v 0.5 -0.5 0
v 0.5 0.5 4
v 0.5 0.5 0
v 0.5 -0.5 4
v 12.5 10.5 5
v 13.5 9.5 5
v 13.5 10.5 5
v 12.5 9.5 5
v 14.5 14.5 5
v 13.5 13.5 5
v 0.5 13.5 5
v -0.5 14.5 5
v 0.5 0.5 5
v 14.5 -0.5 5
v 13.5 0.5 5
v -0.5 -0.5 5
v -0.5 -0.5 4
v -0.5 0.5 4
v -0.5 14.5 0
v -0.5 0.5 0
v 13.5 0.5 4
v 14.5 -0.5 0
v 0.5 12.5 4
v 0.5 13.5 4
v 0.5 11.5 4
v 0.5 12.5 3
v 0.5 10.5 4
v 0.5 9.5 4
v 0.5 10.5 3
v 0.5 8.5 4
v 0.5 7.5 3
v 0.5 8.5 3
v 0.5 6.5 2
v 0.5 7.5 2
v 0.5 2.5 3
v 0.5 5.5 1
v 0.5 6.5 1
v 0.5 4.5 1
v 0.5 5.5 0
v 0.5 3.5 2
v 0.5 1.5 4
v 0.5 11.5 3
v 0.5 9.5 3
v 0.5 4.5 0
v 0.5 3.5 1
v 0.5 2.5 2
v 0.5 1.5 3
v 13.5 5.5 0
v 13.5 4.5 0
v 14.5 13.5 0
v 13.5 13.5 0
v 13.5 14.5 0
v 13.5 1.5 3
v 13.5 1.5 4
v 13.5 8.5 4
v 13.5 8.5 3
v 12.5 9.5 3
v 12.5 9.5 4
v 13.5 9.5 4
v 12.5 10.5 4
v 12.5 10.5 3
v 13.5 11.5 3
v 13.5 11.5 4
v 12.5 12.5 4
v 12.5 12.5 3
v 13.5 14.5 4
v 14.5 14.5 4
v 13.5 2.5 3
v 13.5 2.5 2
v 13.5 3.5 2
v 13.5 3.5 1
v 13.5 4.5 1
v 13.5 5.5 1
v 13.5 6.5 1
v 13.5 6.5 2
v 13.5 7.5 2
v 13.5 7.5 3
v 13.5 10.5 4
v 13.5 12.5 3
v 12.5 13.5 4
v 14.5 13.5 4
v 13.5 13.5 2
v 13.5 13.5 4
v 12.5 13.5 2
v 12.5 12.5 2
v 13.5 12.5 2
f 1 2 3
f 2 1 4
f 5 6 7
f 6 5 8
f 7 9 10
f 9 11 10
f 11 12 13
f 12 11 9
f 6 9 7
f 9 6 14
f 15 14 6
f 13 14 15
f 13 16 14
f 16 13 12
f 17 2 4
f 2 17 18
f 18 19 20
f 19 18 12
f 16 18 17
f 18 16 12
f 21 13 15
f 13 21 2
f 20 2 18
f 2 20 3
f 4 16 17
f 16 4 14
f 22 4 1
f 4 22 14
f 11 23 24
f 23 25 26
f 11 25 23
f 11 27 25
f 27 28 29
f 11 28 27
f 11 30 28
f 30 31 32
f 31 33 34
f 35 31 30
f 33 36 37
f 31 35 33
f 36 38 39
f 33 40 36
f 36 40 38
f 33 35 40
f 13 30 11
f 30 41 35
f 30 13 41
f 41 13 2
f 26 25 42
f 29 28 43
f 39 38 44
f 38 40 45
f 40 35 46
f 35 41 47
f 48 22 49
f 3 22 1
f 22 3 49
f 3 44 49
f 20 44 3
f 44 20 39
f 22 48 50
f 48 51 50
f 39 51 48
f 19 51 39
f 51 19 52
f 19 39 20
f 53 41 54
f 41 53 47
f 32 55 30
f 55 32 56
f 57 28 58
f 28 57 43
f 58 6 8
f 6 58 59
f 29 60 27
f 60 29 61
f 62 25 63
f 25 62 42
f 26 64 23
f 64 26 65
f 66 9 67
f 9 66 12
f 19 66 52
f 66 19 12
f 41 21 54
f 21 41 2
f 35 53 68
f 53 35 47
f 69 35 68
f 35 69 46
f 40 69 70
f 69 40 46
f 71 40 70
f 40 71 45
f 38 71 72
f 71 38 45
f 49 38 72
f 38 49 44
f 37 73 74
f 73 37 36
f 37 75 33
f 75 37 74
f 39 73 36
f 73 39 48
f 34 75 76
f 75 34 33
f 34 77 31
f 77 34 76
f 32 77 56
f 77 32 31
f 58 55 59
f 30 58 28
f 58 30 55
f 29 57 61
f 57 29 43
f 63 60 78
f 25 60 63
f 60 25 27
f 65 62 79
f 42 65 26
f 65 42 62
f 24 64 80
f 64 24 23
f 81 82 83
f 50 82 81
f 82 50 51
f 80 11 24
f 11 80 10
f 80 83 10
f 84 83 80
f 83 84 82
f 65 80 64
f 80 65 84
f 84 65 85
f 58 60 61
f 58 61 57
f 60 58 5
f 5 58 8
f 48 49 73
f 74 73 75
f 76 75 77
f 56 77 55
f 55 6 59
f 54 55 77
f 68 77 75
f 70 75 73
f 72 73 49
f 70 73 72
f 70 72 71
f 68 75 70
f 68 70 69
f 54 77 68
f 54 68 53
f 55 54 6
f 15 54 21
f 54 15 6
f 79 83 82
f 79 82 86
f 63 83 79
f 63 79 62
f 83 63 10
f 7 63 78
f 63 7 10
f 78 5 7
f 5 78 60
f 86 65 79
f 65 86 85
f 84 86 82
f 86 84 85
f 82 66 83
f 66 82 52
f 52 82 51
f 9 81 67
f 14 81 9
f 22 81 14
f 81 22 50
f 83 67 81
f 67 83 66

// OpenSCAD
union() {
    translate([0, 0, 4.5]) color([1, 0, 0]) cube([1, 1, 1], center=true);
    translate([0, 1, 2.5]) cube([1, 1, 5], center=true);
    translate([0, 2, 2.5]) cube([1, 1, 5], center=true);
    translate([0, 3, 2.5]) cube([1, 1, 5], center=true);
    translate([0, 4, 2.5]) cube([1, 1, 5], center=true);
    translate([0, 5, 2.5]) cube([1, 1, 5], center=true);
    translate([0, 6, 2.5]) cube([1, 1, 5], center=true);
    translate([0, 7, 2.5]) cube([1, 1, 5], center=true);
    translate([0, 8, 2.5]) cube([1, 1, 5], center=true);
    translate([0, 9, 2.5]) cube([1, 1, 5], center=true);
    translate([0, 10, 2.5]) cube([1, 1, 5], center=true);
    translate([0, 11, 2.5]) cube([1, 1, 5], center=true);
    translate([0, 12, 2.5]) cube([1, 1, 5], center=true);
    translate([0, 13, 2.5]) cube([1, 1, 5], center=true);
    translate([0, 14, 2.5]) cube([1, 1, 5], center=true);
    translate([1, 0, 2.5]) cube([1, 1, 5], center=true);
    translate([1, 1, 2.0]) cube([1, 1, 4], center=true);
    translate([1, 2, 1.5]) cube([1, 1, 3], center=true);
    translate([1, 3, 1.0]) cube([1, 1, 2], center=true);
    translate([1, 4, 0.5]) cube([1, 1, 1], center=true);
    translate([1, 6, 0.5]) cube([1, 1, 1], center=true);
    translate([1, 7, 1.0]) cube([1, 1, 2], center=true);
    translate([1, 8, 1.5]) cube([1, 1, 3], center=true);
    translate([1, 9, 2.0]) cube([1, 1, 4], center=true);
    translate([1, 10, 1.5]) cube([1, 1, 3], center=true);
    translate([1, 11, 2.0]) cube([1, 1, 4], center=true);
    translate([1, 12, 1.5]) cube([1, 1, 3], center=true);
    translate([1, 13, 2.0]) cube([1, 1, 4], center=true);
    translate([1, 14, 2.5]) cube([1, 1, 5], center=true);
    translate([2, 0, 2.5]) cube([1, 1, 5], center=true);
    translate([2, 1, 2.0]) cube([1, 1, 4], center=true);
    translate([2, 2, 1.5]) cube([1, 1, 3], center=true);
    translate([2, 3, 1.0]) cube([1, 1, 2], center=true);
    translate([2, 4, 0.5]) cube([1, 1, 1], center=true);
    translate([2, 6, 0.5]) cube([1, 1, 1], center=true);
    translate([2, 7, 1.0]) cube([1, 1, 2], center=true);
    translate([2, 8, 1.5]) cube([1, 1, 3], center=true);
    translate([2, 9, 2.0]) cube([1, 1, 4], center=true);
    translate([2, 10, 1.5]) cube([1, 1, 3], center=true);
    translate([2, 11, 2.0]) cube([1, 1, 4], center=true);
    translate([2, 12, 1.5]) cube([1, 1, 3], center=true);
    translate([2, 13, 2.0]) cube([1, 1, 4], center=true);
    translate([2, 14, 2.5]) cube([1, 1, 5], center=true);
    translate([3, 0, 2.5]) cube([1, 1, 5], center=true);
    translate([3, 1, 2.0]) cube([1, 1, 4], center=true);
    translate([3, 2, 1.5]) cube([1, 1, 3], center=true);
    translate([3, 3, 1.0]) cube([1, 1, 2], center=true);
    translate([3, 4, 0.5]) cube([1, 1, 1], center=true);
    translate([3, 6, 0.5]) cube([1, 1, 1], center=true);
    translate([3, 7, 1.0]) cube([1, 1, 2], center=true);
    translate([3, 8, 1.5]) cube([1, 1, 3], center=true);
    translate([3, 9, 2.0]) cube([1, 1, 4], center=true);
    translate([3, 10, 1.5]) cube([1, 1, 3], center=true);
    translate([3, 11, 2.0]) cube([1, 1, 4], center=true);
    translate([3, 12, 1.5]) cube([1, 1, 3], center=true);
    translate([3, 13, 2.0]) cube([1, 1, 4], center=true);
    translate([3, 14, 2.5]) cube([1, 1, 5], center=true);
    translate([4, 0, 2.5]) cube([1, 1, 5], center=true);
    translate([4, 1, 2.0]) cube([1, 1, 4], center=true);
    translate([4, 2, 1.5]) cube([1, 1, 3], center=true);
    translate([4, 3, 1.0]) cube([1, 1, 2], center=true);
    translate([4, 4, 0.5]) cube([1, 1, 1], center=true);
    translate([4, 6, 0.5]) cube([1, 1, 1], center=true);
    translate([4, 7, 1.0]) cube([1, 1, 2], center=true);
    translate([4, 8, 1.5]) cube([1, 1, 3], center=true);
    translate([4, 9, 2.0]) cube([1, 1, 4], center=true);
    translate([4, 10, 1.5]) cube([1, 1, 3], center=true);
    translate([4, 11, 2.0]) cube([1, 1, 4], center=true);
    translate([4, 12, 1.5]) cube([1, 1, 3], center=true);
    translate([4, 13, 2.0]) cube([1, 1, 4], center=true);
    translate([4, 14, 2.5]) cube([1, 1, 5], center=true);
    translate([5, 0, 2.5]) cube([1, 1, 5], center=true);
    translate([5, 1, 2.0]) cube([1, 1, 4], center=true);
    translate([5, 2, 1.5]) cube([1, 1, 3], center=true);
    translate([5, 3, 1.0]) cube([1, 1, 2], center=true);
    translate([5, 4, 0.5]) cube([1, 1, 1], center=true);
    translate([5, 6, 0.5]) cube([1, 1, 1], center=true);
    translate([5, 7, 1.0]) cube([1, 1, 2], center=true);
    translate([5, 8, 1.5]) cube([1, 1, 3], center=true);
    translate([5, 9, 2.0]) cube([1, 1, 4], center=true);
    translate([5, 10, 1.5]) cube([1, 1, 3], center=true);
    translate([5, 11, 2.0]) cube([1, 1, 4], center=true);
    translate([5, 12, 1.5]) cube([1, 1, 3], center=true);
    translate([5, 13, 2.0]) cube([1, 1, 4], center=true);
    translate([5, 14, 2.5]) cube([1, 1, 5], center=true);
    translate([6, 0, 2.5]) cube([1, 1, 5], center=true);
    translate([6, 1, 2.0]) cube([1, 1, 4], center=true);
    translate([6, 2, 1.5]) cube([1, 1, 3], center=true);
    translate([6, 3, 1.0]) cube([1, 1, 2], center=true);
    translate([6, 4, 0.5]) cube([1, 1, 1], center=true);
    translate([6, 6, 0.5]) cube([1, 1, 1], center=true);
    translate([6, 7, 1.0]) cube([1, 1, 2], center=true);
    translate([6, 8, 1.5]) cube([1, 1, 3], center=true);
    translate([6, 9, 2.0]) cube([1, 1, 4], center=true);
    translate([6, 10, 1.5]) cube([1, 1, 3], center=true);
    translate([6, 11, 2.0]) cube([1, 1, 4], center=true);
    translate([6, 12, 1.5]) cube([1, 1, 3], center=true);
    translate([6, 13, 2.0]) cube([1, 1, 4], center=true);
    translate([6, 14, 2.5]) cube([1, 1, 5], center=true);
    translate([7, 0, 2.5]) cube([1, 1, 5], center=true);
    translate([7, 1, 2.0]) cube([1, 1, 4], center=true);
    translate([7, 2, 1.5]) cube([1, 1, 3], center=true);
    translate([7, 3, 1.0]) cube([1, 1, 2], center=true);
    translate([7, 4, 0.5]) cube([1, 1, 1], center=true);
    translate([7, 6, 0.5]) cube([1, 1, 1], center=true);
    translate([7, 7, 1.0]) cube([1, 1, 2], center=true);
    translate([7, 8, 1.5]) cube([1, 1, 3], center=true);
    translate([7, 9, 2.0]) cube([1, 1, 4], center=true);
    translate([7, 10, 1.5]) cube([1, 1, 3], center=true);
    translate([7, 11, 2.0]) cube([1, 1, 4], center=true);
    translate([7, 12, 1.5]) cube([1, 1, 3], center=true);
    translate([7, 13, 2.0]) cube([1, 1, 4], center=true);
    translate([7, 14, 2.5]) cube([1, 1, 5], center=true);
    translate([8, 0, 2.5]) cube([1, 1, 5], center=true);
    translate([8, 1, 2.0]) cube([1, 1, 4], center=true);
    translate([8, 2, 1.5]) cube([1, 1, 3], center=true);
    translate([8, 3, 1.0]) cube([1, 1, 2], center=true);
    translate([8, 4, 0.5]) cube([1, 1, 1], center=true);
    translate([8, 6, 0.5]) cube([1, 1, 1], center=true);
    translate([8, 7, 1.0]) cube([1, 1, 2], center=true);
    translate([8, 8, 1.5]) cube([1, 1, 3], center=true);
    translate([8, 9, 2.0]) cube([1, 1, 4], center=true);
    translate([8, 10, 1.5]) cube([1, 1, 3], center=true);
    translate([8, 11, 2.0]) cube([1, 1, 4], center=true);
    translate([8, 12, 1.5]) cube([1, 1, 3], center=true);
    translate([8, 13, 2.0]) cube([1, 1, 4], center=true);
    translate([8, 14, 2.5]) cube([1, 1, 5], center=true);
    translate([9, 0, 2.5]) cube([1, 1, 5], center=true);
    translate([9, 1, 2.0]) cube([1, 1, 4], center=true);
    translate([9, 2, 1.5]) cube([1, 1, 3], center=true);
    translate([9, 3, 1.0]) cube([1, 1, 2], center=true);
    translate([9, 4, 0.5]) cube([1, 1, 1], center=true);
    translate([9, 6, 0.5]) cube([1, 1, 1], center=true);
    translate([9, 7, 1.0]) cube([1, 1, 2], center=true);
    translate([9, 8, 1.5]) cube([1, 1, 3], center=true);
    translate([9, 9, 2.0]) cube([1, 1, 4], center=true);
    translate([9, 10, 1.5]) cube([1, 1, 3], center=true);
    translate([9, 11, 2.0]) cube([1, 1, 4], center=true);
    translate([9, 12, 1.5]) cube([1, 1, 3], center=true);
    translate([9, 13, 2.0]) cube([1, 1, 4], center=true);
    translate([9, 14, 2.5]) cube([1, 1, 5], center=true);
    translate([10, 0, 2.5]) cube([1, 1, 5], center=true);
    translate([10, 1, 2.0]) cube([1, 1, 4], center=true);
    translate([10, 2, 1.5]) cube([1, 1, 3], center=true);
    translate([10, 3, 1.0]) cube([1, 1, 2], center=true);
    translate([10, 4, 0.5]) cube([1, 1, 1], center=true);
    translate([10, 6, 0.5]) cube([1, 1, 1], center=true);
    translate([10, 7, 1.0]) cube([1, 1, 2], center=true);
    translate([10, 8, 1.5]) cube([1, 1, 3], center=true);
    translate([10, 9, 2.0]) cube([1, 1, 4], center=true);
    translate([10, 10, 1.5]) cube([1, 1, 3], center=true);
    translate([10, 11, 2.0]) cube([1, 1, 4], center=true);
    translate([10, 12, 1.5]) cube([1, 1, 3], center=true);
    translate([10, 13, 2.0]) cube([1, 1, 4], center=true);
    translate([10, 14, 2.5]) cube([1, 1, 5], center=true);
    translate([11, 0, 2.5]) cube([1, 1, 5], center=true);
    translate([11, 1, 2.0]) cube([1, 1, 4], center=true);
    translate([11, 2, 1.5]) cube([1, 1, 3], center=true);
    translate([11, 3, 1.0]) cube([1, 1, 2], center=true);
    translate([11, 4, 0.5]) cube([1, 1, 1], center=true);
    translate([11, 6, 0.5]) cube([1, 1, 1], center=true);
    translate([11, 7, 1.0]) cube([1, 1, 2], center=true);
    translate([11, 8, 1.5]) cube([1, 1, 3], center=true);
    translate([11, 9, 2.0]) cube([1, 1, 4], center=true);
    translate([11, 10, 1.5]) cube([1, 1, 3], center=true);
    translate([11, 11, 2.0]) cube([1, 1, 4], center=true);
    translate([11, 12, 1.5]) cube([1, 1, 3], center=true);
    translate([11, 13, 2.0]) cube([1, 1, 4], center=true);
    translate([11, 14, 2.5]) cube([1, 1, 5], center=true);
    translate([12, 0, 2.5]) cube([1, 1, 5], center=true);
    translate([12, 1, 2.0]) cube([1, 1, 4], center=true);
    translate([12, 2, 1.5]) cube([1, 1, 3], center=true);
    translate([12, 3, 1.0]) cube([1, 1, 2], center=true);
    translate([12, 4, 0.5]) cube([1, 1, 1], center=true);
    translate([12, 6, 0.5]) cube([1, 1, 1], center=true);
    translate([12, 7, 1.0]) cube([1, 1, 2], center=true);
    translate([12, 8, 1.5]) cube([1, 1, 3], center=true);
    translate([12, 9, 2.0]) cube([1, 1, 4], center=true);
    translate([12, 10, 1.5]) cube([1, 1, 3], center=true);
    translate([12, 11, 2.0]) cube([1, 1, 4], center=true);
    translate([12, 12, 1.5]) cube([1, 1, 3], center=true);
    translate([12, 13, 2.0]) cube([1, 1, 4], center=true);
    translate([12, 14, 2.5]) cube([1, 1, 5], center=true);
    translate([13, 0, 2.5]) cube([1, 1, 5], center=true);
    translate([13, 1, 2.0]) cube([1, 1, 4], center=true);
    translate([13, 2, 1.5]) cube([1, 1, 3], center=true);
    translate([13, 3, 1.0]) cube([1, 1, 2], center=true);
    translate([13, 4, 0.5]) cube([1, 1, 1], center=true);
    translate([13, 6, 0.5]) cube([1, 1, 1], center=true);
    translate([13, 7, 1.0]) cube([1, 1, 2], center=true);
    translate([13, 8, 1.5]) cube([1, 1, 3], center=true);
    translate([13, 9, 2.0]) cube([1, 1, 4], center=true);
    translate([13, 10, 2.5]) cube([1, 1, 5], center=true);
    translate([13, 11, 2.0]) cube([1, 1, 4], center=true);
    translate([13, 12, 1.5]) cube([1, 1, 3], center=true);
    translate([13, 13, 1.0]) cube([1, 1, 2], center=true);
    translate([13, 14, 2.5]) cube([1, 1, 5], center=true);
    translate([14, 0, 2.5]) cube([1, 1, 5], center=true);
    translate([14, 1, 2.5]) cube([1, 1, 5], center=true);
    translate([14, 2, 2.5]) cube([1, 1, 5], center=true);
    translate([14, 3, 2.5]) cube([1, 1, 5], center=true);
    translate([14, 4, 2.5]) cube([1, 1, 5], center=true);
    translate([14, 5, 2.5]) cube([1, 1, 5], center=true);
    translate([14, 6, 2.5]) cube([1, 1, 5], center=true);
    translate([14, 7, 2.5]) cube([1, 1, 5], center=true);
    translate([14, 8, 2.5]) cube([1, 1, 5], center=true);
    translate([14, 9, 2.5]) cube([1, 1, 5], center=true);
    translate([14, 10, 2.5]) cube([1, 1, 5], center=true);
    translate([14, 11, 2.5]) cube([1, 1, 5], center=true);
    translate([14, 12, 2.5]) cube([1, 1, 5], center=true);
    translate([14, 13, 2.5]) cube([1, 1, 5], center=true);
    translate([14, 14, 4.5]) color([0, 0, 1]) cube([1, 1, 1], center=true);
}
